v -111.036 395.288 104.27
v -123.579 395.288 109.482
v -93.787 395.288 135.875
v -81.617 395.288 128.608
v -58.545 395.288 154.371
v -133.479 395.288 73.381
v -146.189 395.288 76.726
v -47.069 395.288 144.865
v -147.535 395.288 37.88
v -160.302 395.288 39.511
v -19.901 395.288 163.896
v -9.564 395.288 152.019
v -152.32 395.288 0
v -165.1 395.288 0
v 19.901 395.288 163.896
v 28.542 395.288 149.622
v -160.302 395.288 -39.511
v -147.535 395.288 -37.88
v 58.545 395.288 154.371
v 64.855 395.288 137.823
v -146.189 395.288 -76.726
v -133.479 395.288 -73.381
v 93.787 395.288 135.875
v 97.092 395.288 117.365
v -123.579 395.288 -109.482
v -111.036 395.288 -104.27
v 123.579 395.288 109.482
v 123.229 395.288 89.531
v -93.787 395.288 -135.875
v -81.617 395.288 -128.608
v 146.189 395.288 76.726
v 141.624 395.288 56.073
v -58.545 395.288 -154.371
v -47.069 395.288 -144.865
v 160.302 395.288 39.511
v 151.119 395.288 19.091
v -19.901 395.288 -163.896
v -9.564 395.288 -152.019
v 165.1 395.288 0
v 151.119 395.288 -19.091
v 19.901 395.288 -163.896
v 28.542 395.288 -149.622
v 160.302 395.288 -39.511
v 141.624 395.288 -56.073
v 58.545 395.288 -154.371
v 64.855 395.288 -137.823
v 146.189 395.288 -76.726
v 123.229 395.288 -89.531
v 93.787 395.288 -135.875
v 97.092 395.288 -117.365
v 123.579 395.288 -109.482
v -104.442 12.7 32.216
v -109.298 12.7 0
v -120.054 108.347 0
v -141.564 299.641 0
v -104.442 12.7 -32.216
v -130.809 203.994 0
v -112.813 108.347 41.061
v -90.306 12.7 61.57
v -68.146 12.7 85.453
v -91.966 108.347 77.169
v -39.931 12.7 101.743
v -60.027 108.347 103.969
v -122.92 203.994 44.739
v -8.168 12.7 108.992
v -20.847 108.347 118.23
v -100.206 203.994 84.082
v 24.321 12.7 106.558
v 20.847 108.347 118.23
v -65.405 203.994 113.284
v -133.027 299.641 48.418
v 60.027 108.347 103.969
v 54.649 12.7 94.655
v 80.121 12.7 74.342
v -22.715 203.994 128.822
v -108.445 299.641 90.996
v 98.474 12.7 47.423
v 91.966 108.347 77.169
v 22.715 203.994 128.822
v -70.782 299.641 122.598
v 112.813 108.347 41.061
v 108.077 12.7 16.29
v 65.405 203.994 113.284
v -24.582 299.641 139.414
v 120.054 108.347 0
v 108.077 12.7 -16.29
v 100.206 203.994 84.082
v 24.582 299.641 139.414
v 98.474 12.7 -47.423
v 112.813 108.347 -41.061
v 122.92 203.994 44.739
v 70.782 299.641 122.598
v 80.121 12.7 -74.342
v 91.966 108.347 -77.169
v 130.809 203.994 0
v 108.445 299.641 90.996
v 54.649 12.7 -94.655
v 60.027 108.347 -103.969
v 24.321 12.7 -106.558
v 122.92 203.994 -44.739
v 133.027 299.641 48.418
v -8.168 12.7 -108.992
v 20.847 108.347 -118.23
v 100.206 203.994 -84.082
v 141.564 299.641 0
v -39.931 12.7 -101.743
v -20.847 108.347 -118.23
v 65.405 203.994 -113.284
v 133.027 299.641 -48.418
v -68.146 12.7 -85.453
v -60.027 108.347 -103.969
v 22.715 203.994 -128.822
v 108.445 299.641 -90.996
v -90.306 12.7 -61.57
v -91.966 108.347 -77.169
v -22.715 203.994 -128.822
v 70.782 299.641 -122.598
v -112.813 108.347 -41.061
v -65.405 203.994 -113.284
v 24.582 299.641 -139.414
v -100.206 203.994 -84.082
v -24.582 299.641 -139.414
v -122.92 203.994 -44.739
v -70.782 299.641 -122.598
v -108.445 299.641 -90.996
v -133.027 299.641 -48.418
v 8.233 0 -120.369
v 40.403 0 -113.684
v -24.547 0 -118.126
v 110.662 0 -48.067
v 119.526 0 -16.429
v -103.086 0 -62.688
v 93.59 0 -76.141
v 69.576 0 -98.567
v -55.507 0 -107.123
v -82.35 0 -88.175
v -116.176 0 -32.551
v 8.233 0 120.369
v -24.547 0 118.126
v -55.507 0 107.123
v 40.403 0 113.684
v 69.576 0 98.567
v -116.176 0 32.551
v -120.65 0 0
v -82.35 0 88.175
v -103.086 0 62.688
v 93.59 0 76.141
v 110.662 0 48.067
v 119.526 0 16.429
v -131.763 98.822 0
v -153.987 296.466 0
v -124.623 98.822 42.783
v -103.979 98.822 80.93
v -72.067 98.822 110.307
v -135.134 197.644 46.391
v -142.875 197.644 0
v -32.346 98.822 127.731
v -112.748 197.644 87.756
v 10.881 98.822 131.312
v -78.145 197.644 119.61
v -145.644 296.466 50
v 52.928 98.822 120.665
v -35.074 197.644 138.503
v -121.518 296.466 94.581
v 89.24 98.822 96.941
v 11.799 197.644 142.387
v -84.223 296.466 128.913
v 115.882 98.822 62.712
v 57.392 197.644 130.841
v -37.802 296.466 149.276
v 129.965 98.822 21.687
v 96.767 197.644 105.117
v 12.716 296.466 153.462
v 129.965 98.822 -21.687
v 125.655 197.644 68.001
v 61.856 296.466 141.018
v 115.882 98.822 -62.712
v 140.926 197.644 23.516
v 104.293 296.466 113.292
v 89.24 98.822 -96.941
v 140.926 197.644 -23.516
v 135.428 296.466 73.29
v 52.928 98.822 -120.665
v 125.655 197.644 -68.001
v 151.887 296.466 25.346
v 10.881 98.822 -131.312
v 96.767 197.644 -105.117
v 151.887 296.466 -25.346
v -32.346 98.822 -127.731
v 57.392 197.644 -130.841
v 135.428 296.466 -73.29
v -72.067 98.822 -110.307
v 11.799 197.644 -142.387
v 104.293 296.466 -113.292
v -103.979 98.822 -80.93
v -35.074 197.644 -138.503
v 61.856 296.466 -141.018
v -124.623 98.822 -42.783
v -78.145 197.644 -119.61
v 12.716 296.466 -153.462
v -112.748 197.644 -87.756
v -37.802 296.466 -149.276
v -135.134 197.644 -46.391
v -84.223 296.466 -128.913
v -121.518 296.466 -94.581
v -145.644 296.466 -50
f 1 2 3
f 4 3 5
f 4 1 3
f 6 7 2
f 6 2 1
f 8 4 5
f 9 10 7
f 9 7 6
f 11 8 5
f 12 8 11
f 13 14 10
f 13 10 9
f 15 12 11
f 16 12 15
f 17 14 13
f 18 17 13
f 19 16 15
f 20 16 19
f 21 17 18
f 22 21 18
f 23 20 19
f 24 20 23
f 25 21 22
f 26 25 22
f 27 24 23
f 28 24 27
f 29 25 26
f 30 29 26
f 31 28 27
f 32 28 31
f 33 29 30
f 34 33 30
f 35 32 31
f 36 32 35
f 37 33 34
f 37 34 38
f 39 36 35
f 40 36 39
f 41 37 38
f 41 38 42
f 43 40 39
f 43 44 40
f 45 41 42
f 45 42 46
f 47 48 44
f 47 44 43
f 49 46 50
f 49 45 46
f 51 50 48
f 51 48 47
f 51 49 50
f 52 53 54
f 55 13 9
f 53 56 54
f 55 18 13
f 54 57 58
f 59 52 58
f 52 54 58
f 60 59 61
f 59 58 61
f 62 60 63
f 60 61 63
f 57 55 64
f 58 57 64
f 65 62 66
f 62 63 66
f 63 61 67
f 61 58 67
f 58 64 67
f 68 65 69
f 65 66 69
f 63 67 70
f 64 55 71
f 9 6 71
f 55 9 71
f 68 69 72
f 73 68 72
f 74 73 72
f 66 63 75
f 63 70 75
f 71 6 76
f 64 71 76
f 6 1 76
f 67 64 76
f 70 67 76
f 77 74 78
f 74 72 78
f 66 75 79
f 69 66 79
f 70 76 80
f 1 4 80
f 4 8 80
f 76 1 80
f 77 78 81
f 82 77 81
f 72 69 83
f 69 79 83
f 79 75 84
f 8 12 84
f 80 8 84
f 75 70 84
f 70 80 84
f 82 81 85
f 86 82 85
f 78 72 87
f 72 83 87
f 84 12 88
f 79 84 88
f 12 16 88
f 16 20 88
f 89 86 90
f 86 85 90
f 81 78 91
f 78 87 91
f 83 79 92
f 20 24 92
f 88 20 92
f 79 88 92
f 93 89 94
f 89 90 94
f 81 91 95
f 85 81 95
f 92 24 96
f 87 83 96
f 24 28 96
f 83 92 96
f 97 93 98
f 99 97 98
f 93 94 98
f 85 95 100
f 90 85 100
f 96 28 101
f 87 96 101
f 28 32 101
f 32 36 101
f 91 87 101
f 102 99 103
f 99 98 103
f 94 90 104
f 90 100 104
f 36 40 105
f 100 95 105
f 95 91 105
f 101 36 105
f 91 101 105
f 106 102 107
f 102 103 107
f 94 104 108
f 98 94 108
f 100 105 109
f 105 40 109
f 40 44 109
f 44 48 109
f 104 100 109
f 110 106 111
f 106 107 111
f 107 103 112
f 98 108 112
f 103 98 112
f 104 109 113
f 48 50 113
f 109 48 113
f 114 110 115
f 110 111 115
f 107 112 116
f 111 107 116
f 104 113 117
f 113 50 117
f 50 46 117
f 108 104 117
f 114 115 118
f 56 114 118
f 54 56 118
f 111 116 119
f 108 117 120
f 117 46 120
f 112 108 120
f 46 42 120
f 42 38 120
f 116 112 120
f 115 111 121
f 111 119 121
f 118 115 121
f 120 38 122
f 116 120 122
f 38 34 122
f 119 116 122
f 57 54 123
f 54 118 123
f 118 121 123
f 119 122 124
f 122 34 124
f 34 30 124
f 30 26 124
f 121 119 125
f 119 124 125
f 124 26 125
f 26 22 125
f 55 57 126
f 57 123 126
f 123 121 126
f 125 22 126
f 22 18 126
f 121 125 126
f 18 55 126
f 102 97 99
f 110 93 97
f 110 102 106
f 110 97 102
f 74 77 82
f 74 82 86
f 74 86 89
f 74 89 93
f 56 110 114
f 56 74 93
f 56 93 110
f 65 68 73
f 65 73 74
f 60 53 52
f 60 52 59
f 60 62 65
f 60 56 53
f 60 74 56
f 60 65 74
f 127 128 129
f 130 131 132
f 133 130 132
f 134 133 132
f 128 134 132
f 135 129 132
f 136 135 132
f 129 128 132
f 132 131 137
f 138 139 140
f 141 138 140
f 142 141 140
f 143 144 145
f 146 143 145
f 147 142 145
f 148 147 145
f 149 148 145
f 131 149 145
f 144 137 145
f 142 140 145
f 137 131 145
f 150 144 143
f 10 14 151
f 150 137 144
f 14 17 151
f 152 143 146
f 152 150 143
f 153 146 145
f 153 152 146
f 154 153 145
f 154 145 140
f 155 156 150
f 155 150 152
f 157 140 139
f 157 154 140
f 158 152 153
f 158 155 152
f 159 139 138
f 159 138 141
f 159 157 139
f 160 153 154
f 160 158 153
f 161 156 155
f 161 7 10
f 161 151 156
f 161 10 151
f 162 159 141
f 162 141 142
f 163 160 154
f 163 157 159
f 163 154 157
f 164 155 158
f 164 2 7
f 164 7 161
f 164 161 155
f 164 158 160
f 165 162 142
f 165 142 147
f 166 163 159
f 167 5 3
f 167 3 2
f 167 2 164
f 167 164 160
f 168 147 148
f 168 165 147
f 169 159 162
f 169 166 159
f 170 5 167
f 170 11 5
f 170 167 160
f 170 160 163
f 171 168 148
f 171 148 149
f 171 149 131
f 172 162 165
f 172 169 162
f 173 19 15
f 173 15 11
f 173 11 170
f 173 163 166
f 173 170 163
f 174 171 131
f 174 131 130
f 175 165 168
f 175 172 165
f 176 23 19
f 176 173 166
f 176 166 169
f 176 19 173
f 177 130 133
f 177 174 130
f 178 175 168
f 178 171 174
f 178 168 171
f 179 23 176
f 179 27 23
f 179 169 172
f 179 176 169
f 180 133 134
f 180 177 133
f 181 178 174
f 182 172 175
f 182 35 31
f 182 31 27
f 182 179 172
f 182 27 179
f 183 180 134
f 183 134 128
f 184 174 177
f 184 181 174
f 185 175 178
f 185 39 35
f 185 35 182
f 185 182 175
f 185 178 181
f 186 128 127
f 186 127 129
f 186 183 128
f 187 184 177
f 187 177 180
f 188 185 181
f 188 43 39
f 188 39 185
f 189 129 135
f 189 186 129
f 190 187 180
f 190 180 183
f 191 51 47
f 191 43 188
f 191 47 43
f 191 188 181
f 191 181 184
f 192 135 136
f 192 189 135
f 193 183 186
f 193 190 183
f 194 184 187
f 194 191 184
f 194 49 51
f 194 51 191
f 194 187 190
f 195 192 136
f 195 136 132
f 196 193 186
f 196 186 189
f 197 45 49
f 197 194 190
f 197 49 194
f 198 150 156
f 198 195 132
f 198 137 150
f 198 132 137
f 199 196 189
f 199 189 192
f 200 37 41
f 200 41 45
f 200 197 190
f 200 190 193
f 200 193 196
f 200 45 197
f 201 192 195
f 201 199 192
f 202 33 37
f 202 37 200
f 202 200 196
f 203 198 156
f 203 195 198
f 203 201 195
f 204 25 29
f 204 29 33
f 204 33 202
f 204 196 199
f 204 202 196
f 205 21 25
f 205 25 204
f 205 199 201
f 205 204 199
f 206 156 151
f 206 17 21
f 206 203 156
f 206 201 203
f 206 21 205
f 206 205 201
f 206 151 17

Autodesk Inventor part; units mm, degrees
ref_plane "YZ Plane" through (0, 0, 0) normal (1, 0, 0) x (0, 1, 0)
ref_plane "XZ Plane" through (0, 0, 0) normal (0, 1, 0) x (-1, 0, 0)
ref_plane "XY Plane" through (0, 0, 0) normal (0, 0, 1) x (1, 0, 0)
sketch "Sketch1" plane through (0, 0, 0) normal (0, 1, 0) x (-1, 0, 0)
  circle A0 centre (0, 0) radius 120.65
  dimension "d0" = 241.3
sketch "Sketch2" plane through (0, 0, 0) normal (0, 1, 0) x (-1, 0, 0)
  circle A0 centre (0, 0) radius 5.5202
extrude "Extrusion1" add sketch "Sketch2" along normal blind 395.2875
sketch "Sketch3" plane through (0, 395.2875, 0) normal (0, 1, 0) x (1, 0, 0)
  circle A0 centre (0, 0) radius 5.5202 projected
  circle A1 centre (0, 0) radius 165.1
  dimension "d3" = 330.2
loft "Loft1" add profiles "Sketch1", "Sketch3" contours all / A0 | A1
shell "Shell1" thickness 12.7 removed faces 1 at (-20.3699, 395.2875, -51.1247)
properties part number "Trash Can Bottom" material "Polypropylene"
